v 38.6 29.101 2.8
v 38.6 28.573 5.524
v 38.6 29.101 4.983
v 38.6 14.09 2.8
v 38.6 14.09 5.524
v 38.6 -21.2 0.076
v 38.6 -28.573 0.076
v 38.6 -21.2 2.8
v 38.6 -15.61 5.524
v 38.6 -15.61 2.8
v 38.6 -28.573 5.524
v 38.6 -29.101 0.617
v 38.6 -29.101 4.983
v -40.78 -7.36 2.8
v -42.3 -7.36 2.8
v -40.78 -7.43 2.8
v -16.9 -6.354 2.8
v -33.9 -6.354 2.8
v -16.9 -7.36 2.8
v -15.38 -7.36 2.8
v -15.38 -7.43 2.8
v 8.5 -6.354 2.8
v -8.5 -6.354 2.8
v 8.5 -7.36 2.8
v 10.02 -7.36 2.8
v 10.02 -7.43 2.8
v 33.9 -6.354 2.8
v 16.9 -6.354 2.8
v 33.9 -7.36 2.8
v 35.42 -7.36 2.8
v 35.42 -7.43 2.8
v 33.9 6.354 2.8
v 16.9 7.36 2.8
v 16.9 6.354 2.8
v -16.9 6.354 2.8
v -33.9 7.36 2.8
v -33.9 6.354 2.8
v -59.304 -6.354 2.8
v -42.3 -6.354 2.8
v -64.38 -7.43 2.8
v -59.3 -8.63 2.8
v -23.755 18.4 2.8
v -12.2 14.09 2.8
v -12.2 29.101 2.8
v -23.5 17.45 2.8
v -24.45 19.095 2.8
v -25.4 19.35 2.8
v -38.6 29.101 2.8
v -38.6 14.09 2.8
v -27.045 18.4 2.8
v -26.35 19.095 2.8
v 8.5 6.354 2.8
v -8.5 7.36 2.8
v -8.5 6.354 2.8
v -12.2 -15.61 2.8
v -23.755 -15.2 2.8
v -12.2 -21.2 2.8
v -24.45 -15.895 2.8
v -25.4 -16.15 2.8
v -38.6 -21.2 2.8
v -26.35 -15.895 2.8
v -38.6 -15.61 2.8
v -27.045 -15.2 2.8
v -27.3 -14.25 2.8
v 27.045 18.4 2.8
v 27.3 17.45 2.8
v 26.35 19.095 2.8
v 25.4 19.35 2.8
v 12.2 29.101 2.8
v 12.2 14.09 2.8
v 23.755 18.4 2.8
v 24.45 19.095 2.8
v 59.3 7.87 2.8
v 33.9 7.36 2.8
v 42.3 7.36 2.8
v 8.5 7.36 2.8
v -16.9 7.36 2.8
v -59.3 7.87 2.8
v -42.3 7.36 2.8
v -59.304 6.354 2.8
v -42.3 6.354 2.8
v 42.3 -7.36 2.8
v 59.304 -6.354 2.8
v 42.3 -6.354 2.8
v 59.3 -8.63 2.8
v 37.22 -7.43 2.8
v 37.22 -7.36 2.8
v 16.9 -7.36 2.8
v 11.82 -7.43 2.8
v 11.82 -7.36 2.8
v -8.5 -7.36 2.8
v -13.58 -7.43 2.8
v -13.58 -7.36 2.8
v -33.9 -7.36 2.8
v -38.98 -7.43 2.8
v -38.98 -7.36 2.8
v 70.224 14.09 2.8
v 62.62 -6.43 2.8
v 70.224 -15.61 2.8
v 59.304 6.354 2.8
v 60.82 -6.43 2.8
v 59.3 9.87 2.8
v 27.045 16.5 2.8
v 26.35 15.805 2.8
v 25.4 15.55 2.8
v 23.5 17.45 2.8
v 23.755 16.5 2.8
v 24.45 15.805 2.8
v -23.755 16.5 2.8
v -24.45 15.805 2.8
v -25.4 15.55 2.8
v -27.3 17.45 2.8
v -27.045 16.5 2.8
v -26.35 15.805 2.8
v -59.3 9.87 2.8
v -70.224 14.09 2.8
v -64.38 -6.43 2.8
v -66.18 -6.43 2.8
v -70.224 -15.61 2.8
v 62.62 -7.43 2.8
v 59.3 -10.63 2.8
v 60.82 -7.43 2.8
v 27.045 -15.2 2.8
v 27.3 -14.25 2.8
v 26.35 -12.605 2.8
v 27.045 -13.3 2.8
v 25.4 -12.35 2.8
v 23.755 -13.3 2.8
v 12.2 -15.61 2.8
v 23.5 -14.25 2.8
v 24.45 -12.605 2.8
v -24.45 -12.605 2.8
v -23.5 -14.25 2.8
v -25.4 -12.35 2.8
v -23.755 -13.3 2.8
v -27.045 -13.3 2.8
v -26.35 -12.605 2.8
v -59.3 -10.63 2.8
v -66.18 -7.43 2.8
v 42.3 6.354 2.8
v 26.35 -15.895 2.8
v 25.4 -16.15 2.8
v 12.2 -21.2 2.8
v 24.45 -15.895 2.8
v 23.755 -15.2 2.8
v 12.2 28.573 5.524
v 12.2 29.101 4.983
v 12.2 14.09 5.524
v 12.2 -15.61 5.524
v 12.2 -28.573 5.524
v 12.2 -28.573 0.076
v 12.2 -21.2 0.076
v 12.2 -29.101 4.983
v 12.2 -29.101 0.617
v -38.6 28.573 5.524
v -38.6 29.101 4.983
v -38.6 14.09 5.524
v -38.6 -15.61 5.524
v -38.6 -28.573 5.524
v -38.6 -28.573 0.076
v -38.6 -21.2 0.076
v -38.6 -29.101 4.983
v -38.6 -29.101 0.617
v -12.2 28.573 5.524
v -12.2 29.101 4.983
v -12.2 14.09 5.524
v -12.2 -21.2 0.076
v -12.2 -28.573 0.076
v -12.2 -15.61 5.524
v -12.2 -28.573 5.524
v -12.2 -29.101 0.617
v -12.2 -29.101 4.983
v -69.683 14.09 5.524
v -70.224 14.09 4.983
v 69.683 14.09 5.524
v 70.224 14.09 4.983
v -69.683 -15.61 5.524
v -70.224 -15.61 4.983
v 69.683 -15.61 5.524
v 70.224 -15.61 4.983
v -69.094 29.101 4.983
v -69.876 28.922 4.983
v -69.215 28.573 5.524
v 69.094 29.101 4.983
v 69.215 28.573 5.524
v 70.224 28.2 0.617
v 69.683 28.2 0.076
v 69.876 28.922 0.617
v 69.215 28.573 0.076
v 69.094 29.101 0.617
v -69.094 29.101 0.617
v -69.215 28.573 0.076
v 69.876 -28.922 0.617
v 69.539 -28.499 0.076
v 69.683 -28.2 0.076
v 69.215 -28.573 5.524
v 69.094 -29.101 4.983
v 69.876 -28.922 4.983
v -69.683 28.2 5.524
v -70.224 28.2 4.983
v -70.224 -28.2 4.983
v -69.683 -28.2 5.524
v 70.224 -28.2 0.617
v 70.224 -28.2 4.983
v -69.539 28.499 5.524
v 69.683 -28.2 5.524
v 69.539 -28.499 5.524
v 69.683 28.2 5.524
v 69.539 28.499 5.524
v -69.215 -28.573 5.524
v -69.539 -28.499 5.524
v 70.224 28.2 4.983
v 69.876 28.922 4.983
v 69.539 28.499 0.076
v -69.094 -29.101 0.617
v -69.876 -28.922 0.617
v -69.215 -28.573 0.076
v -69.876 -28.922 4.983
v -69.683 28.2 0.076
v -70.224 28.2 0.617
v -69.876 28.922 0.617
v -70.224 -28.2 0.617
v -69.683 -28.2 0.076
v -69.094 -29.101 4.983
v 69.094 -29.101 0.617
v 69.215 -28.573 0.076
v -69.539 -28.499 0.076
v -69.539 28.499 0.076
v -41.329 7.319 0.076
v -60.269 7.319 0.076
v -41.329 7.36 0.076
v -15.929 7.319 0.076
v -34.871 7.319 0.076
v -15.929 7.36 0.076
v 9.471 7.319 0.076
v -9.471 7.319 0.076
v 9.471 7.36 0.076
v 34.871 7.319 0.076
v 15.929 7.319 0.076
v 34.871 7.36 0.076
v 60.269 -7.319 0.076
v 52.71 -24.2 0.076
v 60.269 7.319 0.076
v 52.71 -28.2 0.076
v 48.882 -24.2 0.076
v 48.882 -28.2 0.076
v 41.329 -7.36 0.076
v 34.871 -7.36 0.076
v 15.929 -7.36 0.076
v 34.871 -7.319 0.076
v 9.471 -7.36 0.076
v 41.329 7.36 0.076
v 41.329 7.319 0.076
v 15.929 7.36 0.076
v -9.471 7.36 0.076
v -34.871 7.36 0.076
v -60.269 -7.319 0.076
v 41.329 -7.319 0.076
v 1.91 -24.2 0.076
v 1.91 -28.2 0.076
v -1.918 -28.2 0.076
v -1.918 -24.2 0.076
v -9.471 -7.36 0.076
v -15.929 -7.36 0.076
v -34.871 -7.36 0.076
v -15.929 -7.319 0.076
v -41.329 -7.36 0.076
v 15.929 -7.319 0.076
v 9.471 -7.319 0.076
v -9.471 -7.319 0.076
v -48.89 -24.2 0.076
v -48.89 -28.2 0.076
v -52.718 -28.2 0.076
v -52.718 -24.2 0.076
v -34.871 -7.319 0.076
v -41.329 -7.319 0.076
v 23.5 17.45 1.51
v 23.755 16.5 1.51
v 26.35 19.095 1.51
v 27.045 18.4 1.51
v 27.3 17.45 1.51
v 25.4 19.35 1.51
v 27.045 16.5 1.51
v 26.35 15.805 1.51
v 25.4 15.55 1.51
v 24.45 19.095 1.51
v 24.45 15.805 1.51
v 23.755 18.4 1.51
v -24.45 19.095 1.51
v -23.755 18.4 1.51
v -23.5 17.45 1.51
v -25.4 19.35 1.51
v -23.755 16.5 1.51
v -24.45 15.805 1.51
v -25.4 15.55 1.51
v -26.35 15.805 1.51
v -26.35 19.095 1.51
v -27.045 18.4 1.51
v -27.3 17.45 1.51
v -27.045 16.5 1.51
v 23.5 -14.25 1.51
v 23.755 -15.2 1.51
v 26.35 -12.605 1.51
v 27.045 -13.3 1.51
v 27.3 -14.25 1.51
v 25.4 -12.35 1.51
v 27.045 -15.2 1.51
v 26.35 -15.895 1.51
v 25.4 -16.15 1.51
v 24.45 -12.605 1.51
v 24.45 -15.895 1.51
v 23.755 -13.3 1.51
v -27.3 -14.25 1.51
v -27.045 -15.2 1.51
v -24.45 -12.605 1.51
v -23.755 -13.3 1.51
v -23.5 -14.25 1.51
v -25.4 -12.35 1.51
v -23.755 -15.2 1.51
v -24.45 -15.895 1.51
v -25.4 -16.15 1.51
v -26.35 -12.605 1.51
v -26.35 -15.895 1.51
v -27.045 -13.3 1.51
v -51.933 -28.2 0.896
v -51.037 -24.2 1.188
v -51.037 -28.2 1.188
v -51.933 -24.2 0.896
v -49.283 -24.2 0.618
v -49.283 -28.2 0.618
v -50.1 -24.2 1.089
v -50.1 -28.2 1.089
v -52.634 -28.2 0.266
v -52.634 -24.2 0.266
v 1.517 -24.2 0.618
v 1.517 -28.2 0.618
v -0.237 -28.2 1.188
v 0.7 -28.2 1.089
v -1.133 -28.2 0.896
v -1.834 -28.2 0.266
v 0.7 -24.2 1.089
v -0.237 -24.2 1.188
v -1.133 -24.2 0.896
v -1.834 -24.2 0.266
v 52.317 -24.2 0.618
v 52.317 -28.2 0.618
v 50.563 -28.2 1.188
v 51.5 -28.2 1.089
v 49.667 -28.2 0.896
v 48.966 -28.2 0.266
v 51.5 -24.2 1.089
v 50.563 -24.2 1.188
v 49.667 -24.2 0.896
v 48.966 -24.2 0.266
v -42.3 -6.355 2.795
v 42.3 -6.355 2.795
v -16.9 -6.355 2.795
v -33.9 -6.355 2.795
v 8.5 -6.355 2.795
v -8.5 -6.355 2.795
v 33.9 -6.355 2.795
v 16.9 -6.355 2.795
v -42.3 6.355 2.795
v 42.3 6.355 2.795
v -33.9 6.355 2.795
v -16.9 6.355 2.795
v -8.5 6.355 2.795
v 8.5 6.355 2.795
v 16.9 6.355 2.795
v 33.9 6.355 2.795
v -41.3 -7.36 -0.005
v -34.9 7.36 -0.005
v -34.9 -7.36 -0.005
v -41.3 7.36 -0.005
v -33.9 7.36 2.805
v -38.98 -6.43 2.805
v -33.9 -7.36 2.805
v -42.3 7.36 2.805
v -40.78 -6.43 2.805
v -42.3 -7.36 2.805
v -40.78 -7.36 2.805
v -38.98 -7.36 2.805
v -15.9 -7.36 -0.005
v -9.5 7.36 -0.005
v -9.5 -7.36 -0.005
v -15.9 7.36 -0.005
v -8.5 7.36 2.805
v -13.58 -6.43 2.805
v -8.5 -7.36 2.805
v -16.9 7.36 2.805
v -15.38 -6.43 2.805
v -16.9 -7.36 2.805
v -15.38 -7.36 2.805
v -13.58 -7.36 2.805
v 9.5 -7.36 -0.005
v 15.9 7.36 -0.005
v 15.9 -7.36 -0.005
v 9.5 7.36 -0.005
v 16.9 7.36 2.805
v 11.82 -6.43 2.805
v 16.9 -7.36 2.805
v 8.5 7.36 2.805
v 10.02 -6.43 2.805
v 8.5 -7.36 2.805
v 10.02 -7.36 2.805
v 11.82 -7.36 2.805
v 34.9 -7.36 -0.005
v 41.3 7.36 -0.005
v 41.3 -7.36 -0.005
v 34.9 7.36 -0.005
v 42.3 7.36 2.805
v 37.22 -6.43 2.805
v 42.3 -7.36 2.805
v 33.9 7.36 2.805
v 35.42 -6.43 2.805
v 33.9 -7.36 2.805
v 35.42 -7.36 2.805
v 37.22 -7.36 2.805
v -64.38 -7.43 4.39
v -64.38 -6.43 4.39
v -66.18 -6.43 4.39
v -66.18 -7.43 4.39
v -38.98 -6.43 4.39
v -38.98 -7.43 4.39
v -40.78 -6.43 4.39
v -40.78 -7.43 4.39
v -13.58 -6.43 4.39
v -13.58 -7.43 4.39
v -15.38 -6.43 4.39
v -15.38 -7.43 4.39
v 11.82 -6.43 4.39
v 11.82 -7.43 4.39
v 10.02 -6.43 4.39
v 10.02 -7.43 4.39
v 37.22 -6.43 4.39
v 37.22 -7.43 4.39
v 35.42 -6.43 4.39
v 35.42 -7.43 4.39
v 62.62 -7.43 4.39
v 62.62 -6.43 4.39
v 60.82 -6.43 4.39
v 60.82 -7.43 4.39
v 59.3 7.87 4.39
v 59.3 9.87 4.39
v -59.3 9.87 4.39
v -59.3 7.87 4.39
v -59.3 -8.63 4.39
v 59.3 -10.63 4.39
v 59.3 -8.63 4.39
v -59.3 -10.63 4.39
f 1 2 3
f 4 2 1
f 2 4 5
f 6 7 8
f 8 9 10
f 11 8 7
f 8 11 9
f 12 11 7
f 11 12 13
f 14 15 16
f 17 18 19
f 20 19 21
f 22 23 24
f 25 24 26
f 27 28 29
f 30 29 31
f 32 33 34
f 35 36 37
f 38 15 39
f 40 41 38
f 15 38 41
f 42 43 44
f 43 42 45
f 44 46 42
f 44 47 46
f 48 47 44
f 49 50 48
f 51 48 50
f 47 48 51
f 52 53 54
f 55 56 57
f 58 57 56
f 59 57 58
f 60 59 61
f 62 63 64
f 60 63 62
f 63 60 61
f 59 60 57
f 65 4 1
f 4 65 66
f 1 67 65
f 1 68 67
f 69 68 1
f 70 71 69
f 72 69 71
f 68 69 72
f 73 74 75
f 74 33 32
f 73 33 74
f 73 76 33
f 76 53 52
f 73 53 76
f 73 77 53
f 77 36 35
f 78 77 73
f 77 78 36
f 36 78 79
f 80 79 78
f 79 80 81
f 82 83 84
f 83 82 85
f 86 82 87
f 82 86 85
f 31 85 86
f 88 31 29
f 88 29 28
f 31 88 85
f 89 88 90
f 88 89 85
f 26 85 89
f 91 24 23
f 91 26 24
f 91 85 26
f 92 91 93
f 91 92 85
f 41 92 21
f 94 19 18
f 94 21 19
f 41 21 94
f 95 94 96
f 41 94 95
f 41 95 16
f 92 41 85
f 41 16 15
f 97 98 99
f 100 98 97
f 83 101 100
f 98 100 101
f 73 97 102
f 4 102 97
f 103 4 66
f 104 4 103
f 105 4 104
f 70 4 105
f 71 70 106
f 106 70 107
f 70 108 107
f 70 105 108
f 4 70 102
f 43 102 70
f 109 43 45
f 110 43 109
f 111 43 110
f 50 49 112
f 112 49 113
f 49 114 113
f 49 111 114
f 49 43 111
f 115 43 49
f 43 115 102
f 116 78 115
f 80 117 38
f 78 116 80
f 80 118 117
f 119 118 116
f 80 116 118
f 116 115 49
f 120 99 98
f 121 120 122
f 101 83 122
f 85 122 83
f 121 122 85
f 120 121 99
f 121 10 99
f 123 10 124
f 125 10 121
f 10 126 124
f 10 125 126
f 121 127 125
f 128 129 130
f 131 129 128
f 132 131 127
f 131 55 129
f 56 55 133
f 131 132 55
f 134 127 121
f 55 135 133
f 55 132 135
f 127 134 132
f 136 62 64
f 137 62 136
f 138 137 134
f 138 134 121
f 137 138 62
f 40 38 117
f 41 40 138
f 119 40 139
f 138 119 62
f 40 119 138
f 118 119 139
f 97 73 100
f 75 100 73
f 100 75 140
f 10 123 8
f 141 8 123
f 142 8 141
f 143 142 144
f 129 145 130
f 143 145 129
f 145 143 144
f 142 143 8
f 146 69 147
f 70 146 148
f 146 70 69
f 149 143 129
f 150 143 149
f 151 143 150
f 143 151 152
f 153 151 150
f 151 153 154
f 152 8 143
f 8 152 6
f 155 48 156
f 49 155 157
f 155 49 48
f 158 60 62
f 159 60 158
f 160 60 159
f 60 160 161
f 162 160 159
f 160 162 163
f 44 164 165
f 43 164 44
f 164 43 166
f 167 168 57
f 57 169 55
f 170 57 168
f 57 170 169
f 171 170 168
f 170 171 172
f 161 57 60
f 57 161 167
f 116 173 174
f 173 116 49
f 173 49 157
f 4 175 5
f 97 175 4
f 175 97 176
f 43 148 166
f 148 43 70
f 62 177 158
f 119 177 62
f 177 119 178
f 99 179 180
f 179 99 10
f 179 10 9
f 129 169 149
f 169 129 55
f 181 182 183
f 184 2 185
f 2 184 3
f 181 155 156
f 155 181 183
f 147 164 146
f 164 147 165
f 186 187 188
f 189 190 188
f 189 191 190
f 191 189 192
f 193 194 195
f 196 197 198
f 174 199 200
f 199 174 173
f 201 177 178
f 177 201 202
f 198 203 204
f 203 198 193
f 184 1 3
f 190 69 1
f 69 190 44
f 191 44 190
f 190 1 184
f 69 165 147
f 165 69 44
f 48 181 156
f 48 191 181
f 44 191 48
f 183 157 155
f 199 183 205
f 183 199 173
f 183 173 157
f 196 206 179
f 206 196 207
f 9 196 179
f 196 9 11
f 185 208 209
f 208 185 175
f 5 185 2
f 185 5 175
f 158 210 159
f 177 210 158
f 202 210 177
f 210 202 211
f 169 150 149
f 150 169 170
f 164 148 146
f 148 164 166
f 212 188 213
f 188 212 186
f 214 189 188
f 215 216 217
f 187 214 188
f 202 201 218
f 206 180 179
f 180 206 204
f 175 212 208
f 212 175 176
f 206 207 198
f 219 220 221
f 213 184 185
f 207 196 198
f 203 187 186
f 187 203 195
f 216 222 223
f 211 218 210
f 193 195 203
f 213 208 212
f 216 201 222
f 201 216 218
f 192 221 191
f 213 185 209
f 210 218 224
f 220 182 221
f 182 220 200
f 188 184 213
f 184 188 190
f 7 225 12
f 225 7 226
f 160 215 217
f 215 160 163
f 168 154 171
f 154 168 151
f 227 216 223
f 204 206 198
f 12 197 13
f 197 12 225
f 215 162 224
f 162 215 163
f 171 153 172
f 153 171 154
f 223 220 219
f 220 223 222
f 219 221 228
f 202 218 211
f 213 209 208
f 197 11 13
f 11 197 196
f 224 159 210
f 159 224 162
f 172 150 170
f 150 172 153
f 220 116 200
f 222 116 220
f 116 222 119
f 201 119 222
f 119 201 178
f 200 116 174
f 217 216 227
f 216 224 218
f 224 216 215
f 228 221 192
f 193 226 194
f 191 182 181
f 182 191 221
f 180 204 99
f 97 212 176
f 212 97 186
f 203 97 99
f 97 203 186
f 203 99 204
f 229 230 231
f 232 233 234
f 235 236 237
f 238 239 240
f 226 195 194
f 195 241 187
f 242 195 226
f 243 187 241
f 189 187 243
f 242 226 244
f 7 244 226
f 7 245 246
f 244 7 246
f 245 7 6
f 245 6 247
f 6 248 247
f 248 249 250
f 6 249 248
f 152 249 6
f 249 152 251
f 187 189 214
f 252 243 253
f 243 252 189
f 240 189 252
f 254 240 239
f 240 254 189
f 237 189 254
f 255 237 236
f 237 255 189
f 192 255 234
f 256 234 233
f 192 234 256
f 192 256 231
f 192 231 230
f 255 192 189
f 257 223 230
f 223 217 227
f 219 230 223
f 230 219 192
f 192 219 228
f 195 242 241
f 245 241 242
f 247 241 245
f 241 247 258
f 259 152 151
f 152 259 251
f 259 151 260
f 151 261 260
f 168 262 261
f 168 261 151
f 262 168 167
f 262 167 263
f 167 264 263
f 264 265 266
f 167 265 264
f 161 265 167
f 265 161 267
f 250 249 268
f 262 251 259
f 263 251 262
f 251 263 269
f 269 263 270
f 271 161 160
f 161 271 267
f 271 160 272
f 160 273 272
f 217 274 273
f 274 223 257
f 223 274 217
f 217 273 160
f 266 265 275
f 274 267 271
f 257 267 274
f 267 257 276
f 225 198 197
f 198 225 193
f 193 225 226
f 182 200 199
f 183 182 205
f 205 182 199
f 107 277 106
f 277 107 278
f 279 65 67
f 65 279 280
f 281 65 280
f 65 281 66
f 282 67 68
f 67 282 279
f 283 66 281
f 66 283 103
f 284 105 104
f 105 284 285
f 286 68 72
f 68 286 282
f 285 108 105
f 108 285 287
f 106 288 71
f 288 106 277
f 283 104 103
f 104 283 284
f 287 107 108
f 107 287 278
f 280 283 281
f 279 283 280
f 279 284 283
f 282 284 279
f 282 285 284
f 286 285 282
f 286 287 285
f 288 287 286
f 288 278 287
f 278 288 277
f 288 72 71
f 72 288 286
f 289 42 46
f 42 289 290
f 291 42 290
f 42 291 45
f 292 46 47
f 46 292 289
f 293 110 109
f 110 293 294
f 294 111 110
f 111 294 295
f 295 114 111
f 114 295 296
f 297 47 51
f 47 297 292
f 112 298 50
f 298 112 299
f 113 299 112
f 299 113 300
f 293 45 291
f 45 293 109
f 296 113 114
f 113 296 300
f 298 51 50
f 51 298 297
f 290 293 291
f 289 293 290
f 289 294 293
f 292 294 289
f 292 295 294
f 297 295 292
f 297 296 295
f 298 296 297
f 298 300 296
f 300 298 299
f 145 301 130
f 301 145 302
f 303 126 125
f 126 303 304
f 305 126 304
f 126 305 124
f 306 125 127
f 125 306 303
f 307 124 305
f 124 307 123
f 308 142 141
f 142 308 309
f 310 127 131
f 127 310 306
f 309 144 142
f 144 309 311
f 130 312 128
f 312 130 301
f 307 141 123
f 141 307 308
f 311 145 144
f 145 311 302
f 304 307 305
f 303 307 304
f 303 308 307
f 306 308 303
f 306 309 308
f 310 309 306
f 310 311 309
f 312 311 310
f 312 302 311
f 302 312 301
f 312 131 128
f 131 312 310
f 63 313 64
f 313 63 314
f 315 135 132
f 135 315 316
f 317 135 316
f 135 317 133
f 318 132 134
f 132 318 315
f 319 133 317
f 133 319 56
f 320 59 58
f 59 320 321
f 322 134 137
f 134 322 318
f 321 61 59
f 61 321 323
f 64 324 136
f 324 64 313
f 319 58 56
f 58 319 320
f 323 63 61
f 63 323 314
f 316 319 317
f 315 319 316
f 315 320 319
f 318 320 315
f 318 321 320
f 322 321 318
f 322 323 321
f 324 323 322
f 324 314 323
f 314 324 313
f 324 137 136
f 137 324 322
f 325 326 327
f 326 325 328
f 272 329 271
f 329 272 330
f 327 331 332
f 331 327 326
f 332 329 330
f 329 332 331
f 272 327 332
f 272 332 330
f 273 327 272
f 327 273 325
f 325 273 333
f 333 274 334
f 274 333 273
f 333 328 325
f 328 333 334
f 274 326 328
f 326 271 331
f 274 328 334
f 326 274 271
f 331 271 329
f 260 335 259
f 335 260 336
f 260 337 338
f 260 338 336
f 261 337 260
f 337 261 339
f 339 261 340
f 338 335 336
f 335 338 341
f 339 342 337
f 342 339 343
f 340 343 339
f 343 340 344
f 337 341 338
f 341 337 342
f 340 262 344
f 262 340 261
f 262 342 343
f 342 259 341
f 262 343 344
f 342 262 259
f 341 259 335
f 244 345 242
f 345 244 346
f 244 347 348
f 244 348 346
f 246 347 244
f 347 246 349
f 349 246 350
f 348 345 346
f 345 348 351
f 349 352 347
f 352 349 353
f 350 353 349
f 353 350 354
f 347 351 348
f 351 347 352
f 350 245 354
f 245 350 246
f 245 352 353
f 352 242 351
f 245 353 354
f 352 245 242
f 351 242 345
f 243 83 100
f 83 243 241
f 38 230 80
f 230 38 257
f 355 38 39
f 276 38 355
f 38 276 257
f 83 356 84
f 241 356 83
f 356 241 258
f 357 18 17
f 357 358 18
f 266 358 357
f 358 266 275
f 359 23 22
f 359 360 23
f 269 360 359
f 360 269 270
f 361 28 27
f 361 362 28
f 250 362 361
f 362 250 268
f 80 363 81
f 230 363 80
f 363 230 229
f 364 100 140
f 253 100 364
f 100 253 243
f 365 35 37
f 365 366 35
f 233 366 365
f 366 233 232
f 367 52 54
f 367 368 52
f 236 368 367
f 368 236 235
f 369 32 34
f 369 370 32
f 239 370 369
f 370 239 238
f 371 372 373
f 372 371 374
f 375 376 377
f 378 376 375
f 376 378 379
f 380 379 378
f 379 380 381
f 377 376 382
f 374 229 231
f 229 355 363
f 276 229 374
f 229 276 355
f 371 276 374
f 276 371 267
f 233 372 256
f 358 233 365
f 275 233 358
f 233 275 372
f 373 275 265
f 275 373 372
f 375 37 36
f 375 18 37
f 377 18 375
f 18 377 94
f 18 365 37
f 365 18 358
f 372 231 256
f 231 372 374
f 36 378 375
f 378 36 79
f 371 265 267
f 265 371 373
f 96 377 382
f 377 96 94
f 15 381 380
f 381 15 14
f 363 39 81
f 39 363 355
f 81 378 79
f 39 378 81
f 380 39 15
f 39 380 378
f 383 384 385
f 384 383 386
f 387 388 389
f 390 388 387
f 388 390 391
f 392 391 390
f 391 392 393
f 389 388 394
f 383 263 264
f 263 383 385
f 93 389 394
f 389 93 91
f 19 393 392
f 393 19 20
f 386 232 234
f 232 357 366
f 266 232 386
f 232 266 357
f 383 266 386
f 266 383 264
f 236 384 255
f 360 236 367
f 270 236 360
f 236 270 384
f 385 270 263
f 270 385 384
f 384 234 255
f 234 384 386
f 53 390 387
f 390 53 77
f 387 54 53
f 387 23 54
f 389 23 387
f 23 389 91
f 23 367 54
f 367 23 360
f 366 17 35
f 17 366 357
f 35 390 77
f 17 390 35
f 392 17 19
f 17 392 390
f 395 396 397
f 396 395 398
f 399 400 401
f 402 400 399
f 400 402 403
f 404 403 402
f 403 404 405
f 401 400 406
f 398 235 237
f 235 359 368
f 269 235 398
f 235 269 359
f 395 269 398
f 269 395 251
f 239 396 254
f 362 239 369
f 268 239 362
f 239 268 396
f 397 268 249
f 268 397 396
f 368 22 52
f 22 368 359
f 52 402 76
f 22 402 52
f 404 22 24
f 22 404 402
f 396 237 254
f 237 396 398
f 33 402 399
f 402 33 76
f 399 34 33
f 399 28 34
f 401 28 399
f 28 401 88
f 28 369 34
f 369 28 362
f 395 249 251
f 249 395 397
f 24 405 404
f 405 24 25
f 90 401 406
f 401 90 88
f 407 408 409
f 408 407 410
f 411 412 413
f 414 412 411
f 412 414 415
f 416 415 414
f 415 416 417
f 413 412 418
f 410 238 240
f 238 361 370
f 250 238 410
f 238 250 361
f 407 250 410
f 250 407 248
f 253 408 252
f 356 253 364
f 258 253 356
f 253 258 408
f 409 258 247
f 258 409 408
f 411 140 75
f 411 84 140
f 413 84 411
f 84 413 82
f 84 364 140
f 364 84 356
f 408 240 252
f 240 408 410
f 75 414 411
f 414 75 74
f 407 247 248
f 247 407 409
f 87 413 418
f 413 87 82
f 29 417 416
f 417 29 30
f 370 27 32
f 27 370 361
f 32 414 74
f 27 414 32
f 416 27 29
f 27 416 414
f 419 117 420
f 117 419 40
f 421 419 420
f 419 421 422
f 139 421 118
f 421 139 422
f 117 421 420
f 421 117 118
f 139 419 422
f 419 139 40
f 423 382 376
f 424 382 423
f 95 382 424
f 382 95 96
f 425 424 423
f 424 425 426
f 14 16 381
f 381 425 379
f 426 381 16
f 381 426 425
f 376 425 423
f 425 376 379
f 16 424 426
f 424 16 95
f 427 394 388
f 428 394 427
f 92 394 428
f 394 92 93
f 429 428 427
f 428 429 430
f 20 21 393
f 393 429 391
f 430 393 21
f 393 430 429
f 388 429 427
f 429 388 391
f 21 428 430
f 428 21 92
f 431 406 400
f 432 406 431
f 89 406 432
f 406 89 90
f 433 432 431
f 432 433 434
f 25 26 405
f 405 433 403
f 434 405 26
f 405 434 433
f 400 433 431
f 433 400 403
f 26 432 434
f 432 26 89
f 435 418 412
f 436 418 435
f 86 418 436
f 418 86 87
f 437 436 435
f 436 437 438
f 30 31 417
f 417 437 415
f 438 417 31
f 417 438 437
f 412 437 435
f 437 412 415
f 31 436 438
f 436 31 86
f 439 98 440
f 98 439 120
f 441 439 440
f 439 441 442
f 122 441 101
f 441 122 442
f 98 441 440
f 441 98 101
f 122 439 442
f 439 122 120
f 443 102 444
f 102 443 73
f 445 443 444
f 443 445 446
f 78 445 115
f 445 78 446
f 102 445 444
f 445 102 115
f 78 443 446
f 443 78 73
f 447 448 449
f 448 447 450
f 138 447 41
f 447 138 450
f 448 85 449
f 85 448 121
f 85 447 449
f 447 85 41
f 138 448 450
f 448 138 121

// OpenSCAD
// -*- mode: SCAD ; c-file-style: "ellemtel" ; coding: utf-8 -*-
//
// Holder to scan 110 film strips with a Reflecta ProScan 10T
//
// © 2018 Roland Sieker <ospalh@gmail.com>
// Licence: CC-BY-SA 4.0


/* [Global] */


// … to preview. You will get both parts when you click “Create Thing”.
part = "halter"; // [halter: film holder, einsatz: film holder clamp]

// Set this to “render” and click on “Create Thing” when done with the setup.
preview = 1; // [0:render, 1:preview]

/* [Holder] */

// Width of the holder. This one and the next one are the two values you do need to set up for your scanner. Preset is for a Reflecta proScan. Maybe subtract half a millimtre for a better fit.
holder_width = 58.4;  // [20:0.1:150]

// Height or thickness of the holder. See above. You know they were too high when you need a mallet to go from one image to the next…
holder_thickness = 5.6;  // [3:0.1:10]

// How many exposures on the longest strips you want to fit into this. Make sure the resulting holder still fits onto your print bed.
images_per_strip = 5;  // [1:1:15]

// Different manufacturers’ scanners place their little catches to position the holder at different sides.
position_notch_side = 90;  // [90: bottom, 0: side]

/* [Magnets] */

// Diameter of the magnet hole. Add clearance by hand here. Set to 0 for no magnet holes.
magnet_diameter = 3.8;  // [0:0.1:15]
// Height or thickness of the magnet. Make sure to use magnets flat enough to fit.
magnet_height = 1;  // [0.5:0.1:3]

/* [Hidden] */

// Das ganze Filmgrößen-Geraffel wieder verstecken: ein thing pro
// Film. Teil der Automatik (mit/ohne Stege, Lang-oder Kurzkerbe) sind so
// halbwegs inaktiv.


// Width of the film
film_width = 16;  // [8:0.1:70]
// Length from the left edge of an exposure to its right edge
image_width = 17; // [8:0.1:100]
image_pitch = 127/5;  // Ein Fünferstreifen ist genau so lang wie ein
// vierer 126-Streifen. Angeblich ist das irgend etwas rundes in
// Zöllen. Das muss mich nicht scheren.

// Size of an exposure from bottom to top.
image_height = 12.7; // Genau 300 Pixel hoch bei einem 600 dpi Scan.
rand_unten = 1.27;  // Könnten 1/20 Zoll sein. What TF ever. Ich könnte 118 Schweizerfranken bezahlen und es im Standard nachlesen. Oder das Geld sparen
rand_oben = film_width - image_height - rand_unten;

bildabstand = max(image_pitch, image_width);
l_filmsteg = max(0, bildabstand-image_width);
r_r = 1.0;  // Rundungsradius

// Auch wichtig:
l_zk = 4;  // Länge Zentrierkerbe
b_zk = 4;  // Breite Zentrierkerbe
h_zk = 1.2;  // Tiefe der Zentrierkerbe
w_zk = 1;  // Wand bzw Abstand der Zentrierkerbe vom Rand





w_schraeg = 1;  // Breite der Abschrägung rund um die Filmfenster

kurzsteg_grenze = w_schraeg;  // Weniger als 1 mm pro Seite: Kurzstege

mit_langsteg_oben = ( rand_oben >= kurzsteg_grenze);
mit_langsteg_unten = ( rand_unten >= kurzsteg_grenze);

min_l_ksteg = 0.8;

w_steg = 2;  // Breite für Stücke, die den Film zentrieren.
l_kurzsteg = 0.4*bildabstand;  // Länge für Stücke, die den Film zentrieren,
// wenn wir keine Fensterstege machen


magnet_off_oben = -2;
magnet_off_unten = 1.2;

w_filmloch = 1.5;
l_filmloch = 2.3;
// dy_fl_bl = 1.25; // Abstand Filmloch oben zum Blidbereich
dy_fl_k = 0.7;  // Abstand Filmloch oben zur Filmkante
dx_fl_sm = 0.63;  // Abstand Filmloch links zur Mitte des Stegs


// *******************************************************
// Extra parameters. These can be changed reasonably safely.


w = 1.8;  // Wall width
p = 1.2;  // Bottom, top plate height
c = 0.5;  // Clearance
c_z = 0.3;  // Clearance in z direction. Mostly for the magnet hole and centering ridge
angle = 60; // Overhangs much below 60° are a problem for me


// Halbwegs wichtig
h_steg = 1.6;  // Höhe für Stücke, die den Film zentrieren.
h_nut = h_steg + c_z;  // Tiefe für Stücke, auf denen der Film nicht aufliegt



// *******************************************************
// Some shortcuts. These shouldn’t be changed

tau = 2 * PI;  // π is still wrong. τ = ⌀ ÷ r

xy_factor = 1/tan(angle);
// To get from a height to a horizontal width inclined correctly
z_factor = tan(angle);  // The other way around

some_distance = 1.2 * holder_width;
ms = 0.01;  // Muggeseggele.

// fn for differently sized objects and fs, fa; all for preview or rendering.
pna = 40;
pnb = 15;
pa = 5;
ps = 1;
rna = 180;
rnb = 30;
ra = 1;
rs = 0.1;
function na() = (preview) ? pna : rna;
function nb() = (preview) ? pnb : rnb;
$fs = (preview) ? ps : rs;
$fa = (preview) ? pa : ra;

// l_fenster = bildabstand * images_per_strip;
l_fenster = bildabstand * (images_per_strip - 1) + image_width;
l_rand = 2 * w_steg + w_schraeg + 6;  // Etwas mehr für Extra-Zentriernasen
w_rand = w_schraeg + 7;
l_ue_a =  l_fenster + 2*l_rand;
w_einsatz = image_height + 2 * w_rand;
h_bd = holder_thickness/2;  // Höhe Boden oder Deckel

l_griff = 25.4;
o_griff = l_ue_a/2-l_fenster/2 + image_width/2 + image_pitch/2;
w_griff = 6;


to_griff = l_ue_a/2 - o_griff - l_griff/2;



// *******************************************************
// End setup




// *******************************************************
// Generate the parts


print_part();
// filmhalter();
// einsatz();
// preview_parts();
// stack_parts();



module print_part()
{
   if ("halter" == part)
   {
      filmhalter();
   }
   if ("einsatz" == part)
   {
      einsatz();
   }
}

module preview_parts()
{
   filmhalter();
   translate([0, some_distance, 0])
   {
      einsatz();
   }
}

module stack_parts()
{
   // intersection()
   {
       // color("yellow")
      {
         filmhalter();
      }
      translate([0,0,holder_thickness + ms])
      {
         rotate([0,180,0])
         {
            // color("red")
            {
               einsatz();
            }
         }
      }
   }
}

// *******************************************************
// Code for the parts themselves


module filmhalter()
{
   difference()
   {
      basis_filmhalter();
      fenster();
      magnetausschnitte();
      kerben(false);
   }
   fensterstege();
   bodenstege();
}

module einsatz()
{
   difference()
   {
      union()
      {
         difference()
         {
            basis_einsatz();
            fenster();
         }
         fensterstege();
      }
      einsatzausschnitte();
      // magnetausschnitte(magnet_diameter/2);
      magnetausschnitte();
      kerben(true);
   }

}


module basis_filmhalter()
{
   translate([0,0,h_bd])
   {
      difference()
      {
         massiver_halter();
         einsatz_ausschnitt(2*c);
      }
   }
}


module basis_einsatz()
{
   translate([0,0,h_bd])
   {
      intersection()
      {
         massiver_halter();
         rotate([0,180,0])
         {
            einsatz_ausschnitt(0);
         }
      }
   }

}

module massiver_halter()
{
   hull()
   {
      vosp();
      mirror([0,0,1])
      {
         vosp();
      }
   }

   module vosp()
   {
      tosp();
      mirror([0,1,0])
      {
         tosp();
      }
   }
   module tosp()
   {
      osp();
      mirror([1,0,0])
      {
         osp();
      }

   }

   module osp()
   {
      translate([l_ue_a/2-r_r, holder_width/2-r_r, holder_thickness/2-r_r])
      {
         sphere(r=r_r);
      }
   }
}


module einsatz_ausschnitt(ec)
{
   translate([0, 0, holder_thickness])
   {
      translate([0, rand_unten - rand_oben, 0])
      cube([l_ue_a+2*ms, w_einsatz + ec, 2*holder_thickness], center=true);
      grip_cut();
      mirror()
      {
         grip_cut();
      }
   }
   module grip_cut()
   {
      translate([to_griff, 0, 0])
      {
         cube([l_griff + ec, holder_width + 2*ms, 2*holder_thickness], center=true);
         translate([0, -holder_width/2, 0])
         {
            cube([l_griff + ec, 2*w_griff+4*ec, 4*holder_thickness], center=true);
         }
      }
   }
}

module fenster()
{
   translate([0, 0, h_bd])
   {
      hull()
      {
         translate([0,0,-0.5+ms])
         {
            cube([l_fenster, image_height, 1], center=true);
         }
         translate([0,0,-h_bd-0.5-ms])
         {
            cube(
               [l_fenster+2*w_schraeg, image_height+2*w_schraeg, 1], center=true);
         }
      }

   }
}


module magnetausschnitte()
{
   if (magnet_diameter > 0 && magnet_height > 0)
   {
      yo_mag = w_einsatz/2 + magnet_diameter/2;
      magnetausschnitt(to_griff, yo_mag + magnet_off_unten);
      magnetausschnitt(-to_griff, yo_mag + magnet_off_unten);
      magnetausschnitt(to_griff, -yo_mag - magnet_off_oben);
      magnetausschnitt(-to_griff, -yo_mag - magnet_off_oben);
   }
}

module magnetausschnitt(exo, eyo)
{


   // Mittig in den Griffen.
   translate(
      [exo, eyo, h_bd - magnet_height-c_z + ms])
   {
      cylinder(d=magnet_diameter, h=magnet_height+c_z);
      // N.B. Spiel ist schon im magnet_diameter eingerechnet
   }
}

module bodenstege()
{
   translate([0, 0, -ms+h_steg/2+h_bd])
   {
      if (mit_langsteg_unten)
      {
         langbodensteg(rand_unten);
      }
      else
      {
         kurzbodenstege(rand_unten);
      }
      if (mit_langsteg_oben)
      {
         rotate(180)
         {
            langbodensteg(rand_oben);
         }
      }
      else
      {
         rotate(180)
         {
            kurzbodenstege(rand_oben);
         }
      }
      zentriernasen();
   }
   module langbodensteg(eo)
   {
      translate([0,w_steg/2+image_height/2+c/2+eo, 0])
      {
         cube([l_fenster, w_steg, h_steg], center=true);
      }
   }
   module kurzbodenstege(eo)
   {
      for (i=[0:images_per_strip-1])
      {
         translate([-l_fenster/2 + (0.5 + i) * bildabstand, w_steg/2+image_height/2+eo+c/2, 0])
         {
            cube([l_kurzsteg, w_steg, h_steg], center=true);
         }
      }
   }
   module zentriernasen()
   {
      for (i=[-0.5:1:images_per_strip-0.5])
      {
         // Eine mehr als Bilder:
         // Irgendwie ist »oben« und »unten« verkehrt. Für Teile oben
         // braucht mensch negative y-Werte.
         translate(
            [-l_fenster/2 + i * bildabstand+image_width/2 - dx_fl_sm +c/2 - l_filmloch,
             -image_height/2 - rand_oben + c/2 + dy_fl_k , -h_steg/2])

         {
            cube([l_filmloch-c, w_filmloch-c, h_steg]);
         }
      }
   }
}

module einsatzausschnitte()
{
   translate([0, 0, h_bd + ms-h_nut/2])
   {
      if (mit_langsteg_unten)
      {
         langausschnitt(rand_unten);
      }
      else
      {
         kurzausschnitte(rand_unten);
      }
      if (mit_langsteg_oben)
      {
         rotate(180)
         {
            langausschnitt(rand_oben);
         }
      }
      else
      {
         rotate(180)
         {
            kurzausschnitte(rand_oben);
         }
      }
      zentrierausschnitte();
   }
   module langausschnitt(eyo)
   {
      translate([0,w_steg/2+image_height/2+eyo+c/2,0])
      {
         cube([l_fenster+6*c, w_steg+2*c, h_nut], center=true);
      }
   }
   module kurzausschnitte(eyo)
   {
      for (i=[0:images_per_strip-1])
      {
         translate(
            [-l_fenster/2 + (0.5 + i) * bildabstand,
             w_steg/2+image_height/2+eyo+c/2-film_width/4 + image_height/4, 0])
         {
            cube(
               [l_kurzsteg+2*c, w_steg+2*c+film_width/2 - image_height/2,
                h_nut], center=true);
         }
      }
   }
      module zentrierausschnitte()
   {
      for (i=[-0.5:1:images_per_strip-0.5])
      {
         translate(
            [-l_fenster/2 + i * bildabstand+image_width/2  + dx_fl_sm -c/2,
             -image_height/2 - rand_oben - c/2 + dy_fl_k , -h_nut/2])

         {
            cube([l_filmloch+c, w_filmloch+c, h_nut]);
         }
      }
   }
}


module fensterstege()
{
   if (l_filmsteg > 0)
   {
      for (i=[0.5:1:images_per_strip-1.5])
      {
         translate([-l_fenster/2 + i * bildabstand + image_width/2, 0, 0])
         {
            if (l_filmsteg < min_l_ksteg)
            {
               quader_fenstersteg();
            }
            else
            {
               keil_fenstersteg();
            }
         }
      }
   }
   module quader_fenstersteg()
   {
      translate([0,0,h_bd/2-ms])
      {
         cube([l_filmsteg, image_height+2*w_schraeg + 2*ms ,h_bd], center=true);
      }
   }
   module keil_fenstersteg()
   {
      l_fsb = max(l_filmsteg-2*w_schraeg,min_l_ksteg);
      ihp = image_height + 2*w_schraeg + 2*ms;
      echo("fenstersteg am boden",l_fsb);
      hull()
      {
         translate([0,0,h_bd])
         {
            cube([l_filmsteg, ihp, ms], center=true);
         }
         //  translate([0,0,-ms])
         cube([l_fsb, ihp, ms], center=true);
      }
   }
}

module kerben(oben)
{
   // Den Radius der Zentrierkerbe kann mensch per Pythagoras bestimmen.
   // Hypothenuse = r_zk
   // 1. Kathete = l_zk/2
   // 2. Kathete = r_zk - h_zk
   // h_zk > 0
   // r_zk * r_zk = l_zk * l_zk / 4 + r_zk * r_zk - 2 * r_zk * h_zk + h_zk * h_zk
   // 0 = l_zk * l_zk / 4 - 2 * r_zk * h_zk + h_zk * h_zk
   // 2 * r_zk * h_zk =
   r_zk = (l_zk * l_zk / 4 + h_zk * h_zk) / (2 * h_zk);
   // Die Variable heißt »position_notch_side«, und enthält einen Winkel. Funktioniert.
   dz_zk = (position_notch_side > 0) ?
      ( (oben) ? holder_thickness - h_zk + r_zk : h_zk-r_zk) :
      -ms;
   ahzk = (position_notch_side > 0) ? b_zk : holder_thickness + 2*ms;
   hk_yo = (position_notch_side > 0) ? -w_zk - b_zk : r_zk -h_zk;
   for (i=[0:images_per_strip-1])
   {
      translate(
         [-l_fenster/2 + i * bildabstand + image_width/2, -holder_width/2 -hk_yo, dz_zk])
      {
         rotate([position_notch_side,0,0])
         {
            cylinder(r=r_zk, h=ahzk);
         }
      }
   }

}
